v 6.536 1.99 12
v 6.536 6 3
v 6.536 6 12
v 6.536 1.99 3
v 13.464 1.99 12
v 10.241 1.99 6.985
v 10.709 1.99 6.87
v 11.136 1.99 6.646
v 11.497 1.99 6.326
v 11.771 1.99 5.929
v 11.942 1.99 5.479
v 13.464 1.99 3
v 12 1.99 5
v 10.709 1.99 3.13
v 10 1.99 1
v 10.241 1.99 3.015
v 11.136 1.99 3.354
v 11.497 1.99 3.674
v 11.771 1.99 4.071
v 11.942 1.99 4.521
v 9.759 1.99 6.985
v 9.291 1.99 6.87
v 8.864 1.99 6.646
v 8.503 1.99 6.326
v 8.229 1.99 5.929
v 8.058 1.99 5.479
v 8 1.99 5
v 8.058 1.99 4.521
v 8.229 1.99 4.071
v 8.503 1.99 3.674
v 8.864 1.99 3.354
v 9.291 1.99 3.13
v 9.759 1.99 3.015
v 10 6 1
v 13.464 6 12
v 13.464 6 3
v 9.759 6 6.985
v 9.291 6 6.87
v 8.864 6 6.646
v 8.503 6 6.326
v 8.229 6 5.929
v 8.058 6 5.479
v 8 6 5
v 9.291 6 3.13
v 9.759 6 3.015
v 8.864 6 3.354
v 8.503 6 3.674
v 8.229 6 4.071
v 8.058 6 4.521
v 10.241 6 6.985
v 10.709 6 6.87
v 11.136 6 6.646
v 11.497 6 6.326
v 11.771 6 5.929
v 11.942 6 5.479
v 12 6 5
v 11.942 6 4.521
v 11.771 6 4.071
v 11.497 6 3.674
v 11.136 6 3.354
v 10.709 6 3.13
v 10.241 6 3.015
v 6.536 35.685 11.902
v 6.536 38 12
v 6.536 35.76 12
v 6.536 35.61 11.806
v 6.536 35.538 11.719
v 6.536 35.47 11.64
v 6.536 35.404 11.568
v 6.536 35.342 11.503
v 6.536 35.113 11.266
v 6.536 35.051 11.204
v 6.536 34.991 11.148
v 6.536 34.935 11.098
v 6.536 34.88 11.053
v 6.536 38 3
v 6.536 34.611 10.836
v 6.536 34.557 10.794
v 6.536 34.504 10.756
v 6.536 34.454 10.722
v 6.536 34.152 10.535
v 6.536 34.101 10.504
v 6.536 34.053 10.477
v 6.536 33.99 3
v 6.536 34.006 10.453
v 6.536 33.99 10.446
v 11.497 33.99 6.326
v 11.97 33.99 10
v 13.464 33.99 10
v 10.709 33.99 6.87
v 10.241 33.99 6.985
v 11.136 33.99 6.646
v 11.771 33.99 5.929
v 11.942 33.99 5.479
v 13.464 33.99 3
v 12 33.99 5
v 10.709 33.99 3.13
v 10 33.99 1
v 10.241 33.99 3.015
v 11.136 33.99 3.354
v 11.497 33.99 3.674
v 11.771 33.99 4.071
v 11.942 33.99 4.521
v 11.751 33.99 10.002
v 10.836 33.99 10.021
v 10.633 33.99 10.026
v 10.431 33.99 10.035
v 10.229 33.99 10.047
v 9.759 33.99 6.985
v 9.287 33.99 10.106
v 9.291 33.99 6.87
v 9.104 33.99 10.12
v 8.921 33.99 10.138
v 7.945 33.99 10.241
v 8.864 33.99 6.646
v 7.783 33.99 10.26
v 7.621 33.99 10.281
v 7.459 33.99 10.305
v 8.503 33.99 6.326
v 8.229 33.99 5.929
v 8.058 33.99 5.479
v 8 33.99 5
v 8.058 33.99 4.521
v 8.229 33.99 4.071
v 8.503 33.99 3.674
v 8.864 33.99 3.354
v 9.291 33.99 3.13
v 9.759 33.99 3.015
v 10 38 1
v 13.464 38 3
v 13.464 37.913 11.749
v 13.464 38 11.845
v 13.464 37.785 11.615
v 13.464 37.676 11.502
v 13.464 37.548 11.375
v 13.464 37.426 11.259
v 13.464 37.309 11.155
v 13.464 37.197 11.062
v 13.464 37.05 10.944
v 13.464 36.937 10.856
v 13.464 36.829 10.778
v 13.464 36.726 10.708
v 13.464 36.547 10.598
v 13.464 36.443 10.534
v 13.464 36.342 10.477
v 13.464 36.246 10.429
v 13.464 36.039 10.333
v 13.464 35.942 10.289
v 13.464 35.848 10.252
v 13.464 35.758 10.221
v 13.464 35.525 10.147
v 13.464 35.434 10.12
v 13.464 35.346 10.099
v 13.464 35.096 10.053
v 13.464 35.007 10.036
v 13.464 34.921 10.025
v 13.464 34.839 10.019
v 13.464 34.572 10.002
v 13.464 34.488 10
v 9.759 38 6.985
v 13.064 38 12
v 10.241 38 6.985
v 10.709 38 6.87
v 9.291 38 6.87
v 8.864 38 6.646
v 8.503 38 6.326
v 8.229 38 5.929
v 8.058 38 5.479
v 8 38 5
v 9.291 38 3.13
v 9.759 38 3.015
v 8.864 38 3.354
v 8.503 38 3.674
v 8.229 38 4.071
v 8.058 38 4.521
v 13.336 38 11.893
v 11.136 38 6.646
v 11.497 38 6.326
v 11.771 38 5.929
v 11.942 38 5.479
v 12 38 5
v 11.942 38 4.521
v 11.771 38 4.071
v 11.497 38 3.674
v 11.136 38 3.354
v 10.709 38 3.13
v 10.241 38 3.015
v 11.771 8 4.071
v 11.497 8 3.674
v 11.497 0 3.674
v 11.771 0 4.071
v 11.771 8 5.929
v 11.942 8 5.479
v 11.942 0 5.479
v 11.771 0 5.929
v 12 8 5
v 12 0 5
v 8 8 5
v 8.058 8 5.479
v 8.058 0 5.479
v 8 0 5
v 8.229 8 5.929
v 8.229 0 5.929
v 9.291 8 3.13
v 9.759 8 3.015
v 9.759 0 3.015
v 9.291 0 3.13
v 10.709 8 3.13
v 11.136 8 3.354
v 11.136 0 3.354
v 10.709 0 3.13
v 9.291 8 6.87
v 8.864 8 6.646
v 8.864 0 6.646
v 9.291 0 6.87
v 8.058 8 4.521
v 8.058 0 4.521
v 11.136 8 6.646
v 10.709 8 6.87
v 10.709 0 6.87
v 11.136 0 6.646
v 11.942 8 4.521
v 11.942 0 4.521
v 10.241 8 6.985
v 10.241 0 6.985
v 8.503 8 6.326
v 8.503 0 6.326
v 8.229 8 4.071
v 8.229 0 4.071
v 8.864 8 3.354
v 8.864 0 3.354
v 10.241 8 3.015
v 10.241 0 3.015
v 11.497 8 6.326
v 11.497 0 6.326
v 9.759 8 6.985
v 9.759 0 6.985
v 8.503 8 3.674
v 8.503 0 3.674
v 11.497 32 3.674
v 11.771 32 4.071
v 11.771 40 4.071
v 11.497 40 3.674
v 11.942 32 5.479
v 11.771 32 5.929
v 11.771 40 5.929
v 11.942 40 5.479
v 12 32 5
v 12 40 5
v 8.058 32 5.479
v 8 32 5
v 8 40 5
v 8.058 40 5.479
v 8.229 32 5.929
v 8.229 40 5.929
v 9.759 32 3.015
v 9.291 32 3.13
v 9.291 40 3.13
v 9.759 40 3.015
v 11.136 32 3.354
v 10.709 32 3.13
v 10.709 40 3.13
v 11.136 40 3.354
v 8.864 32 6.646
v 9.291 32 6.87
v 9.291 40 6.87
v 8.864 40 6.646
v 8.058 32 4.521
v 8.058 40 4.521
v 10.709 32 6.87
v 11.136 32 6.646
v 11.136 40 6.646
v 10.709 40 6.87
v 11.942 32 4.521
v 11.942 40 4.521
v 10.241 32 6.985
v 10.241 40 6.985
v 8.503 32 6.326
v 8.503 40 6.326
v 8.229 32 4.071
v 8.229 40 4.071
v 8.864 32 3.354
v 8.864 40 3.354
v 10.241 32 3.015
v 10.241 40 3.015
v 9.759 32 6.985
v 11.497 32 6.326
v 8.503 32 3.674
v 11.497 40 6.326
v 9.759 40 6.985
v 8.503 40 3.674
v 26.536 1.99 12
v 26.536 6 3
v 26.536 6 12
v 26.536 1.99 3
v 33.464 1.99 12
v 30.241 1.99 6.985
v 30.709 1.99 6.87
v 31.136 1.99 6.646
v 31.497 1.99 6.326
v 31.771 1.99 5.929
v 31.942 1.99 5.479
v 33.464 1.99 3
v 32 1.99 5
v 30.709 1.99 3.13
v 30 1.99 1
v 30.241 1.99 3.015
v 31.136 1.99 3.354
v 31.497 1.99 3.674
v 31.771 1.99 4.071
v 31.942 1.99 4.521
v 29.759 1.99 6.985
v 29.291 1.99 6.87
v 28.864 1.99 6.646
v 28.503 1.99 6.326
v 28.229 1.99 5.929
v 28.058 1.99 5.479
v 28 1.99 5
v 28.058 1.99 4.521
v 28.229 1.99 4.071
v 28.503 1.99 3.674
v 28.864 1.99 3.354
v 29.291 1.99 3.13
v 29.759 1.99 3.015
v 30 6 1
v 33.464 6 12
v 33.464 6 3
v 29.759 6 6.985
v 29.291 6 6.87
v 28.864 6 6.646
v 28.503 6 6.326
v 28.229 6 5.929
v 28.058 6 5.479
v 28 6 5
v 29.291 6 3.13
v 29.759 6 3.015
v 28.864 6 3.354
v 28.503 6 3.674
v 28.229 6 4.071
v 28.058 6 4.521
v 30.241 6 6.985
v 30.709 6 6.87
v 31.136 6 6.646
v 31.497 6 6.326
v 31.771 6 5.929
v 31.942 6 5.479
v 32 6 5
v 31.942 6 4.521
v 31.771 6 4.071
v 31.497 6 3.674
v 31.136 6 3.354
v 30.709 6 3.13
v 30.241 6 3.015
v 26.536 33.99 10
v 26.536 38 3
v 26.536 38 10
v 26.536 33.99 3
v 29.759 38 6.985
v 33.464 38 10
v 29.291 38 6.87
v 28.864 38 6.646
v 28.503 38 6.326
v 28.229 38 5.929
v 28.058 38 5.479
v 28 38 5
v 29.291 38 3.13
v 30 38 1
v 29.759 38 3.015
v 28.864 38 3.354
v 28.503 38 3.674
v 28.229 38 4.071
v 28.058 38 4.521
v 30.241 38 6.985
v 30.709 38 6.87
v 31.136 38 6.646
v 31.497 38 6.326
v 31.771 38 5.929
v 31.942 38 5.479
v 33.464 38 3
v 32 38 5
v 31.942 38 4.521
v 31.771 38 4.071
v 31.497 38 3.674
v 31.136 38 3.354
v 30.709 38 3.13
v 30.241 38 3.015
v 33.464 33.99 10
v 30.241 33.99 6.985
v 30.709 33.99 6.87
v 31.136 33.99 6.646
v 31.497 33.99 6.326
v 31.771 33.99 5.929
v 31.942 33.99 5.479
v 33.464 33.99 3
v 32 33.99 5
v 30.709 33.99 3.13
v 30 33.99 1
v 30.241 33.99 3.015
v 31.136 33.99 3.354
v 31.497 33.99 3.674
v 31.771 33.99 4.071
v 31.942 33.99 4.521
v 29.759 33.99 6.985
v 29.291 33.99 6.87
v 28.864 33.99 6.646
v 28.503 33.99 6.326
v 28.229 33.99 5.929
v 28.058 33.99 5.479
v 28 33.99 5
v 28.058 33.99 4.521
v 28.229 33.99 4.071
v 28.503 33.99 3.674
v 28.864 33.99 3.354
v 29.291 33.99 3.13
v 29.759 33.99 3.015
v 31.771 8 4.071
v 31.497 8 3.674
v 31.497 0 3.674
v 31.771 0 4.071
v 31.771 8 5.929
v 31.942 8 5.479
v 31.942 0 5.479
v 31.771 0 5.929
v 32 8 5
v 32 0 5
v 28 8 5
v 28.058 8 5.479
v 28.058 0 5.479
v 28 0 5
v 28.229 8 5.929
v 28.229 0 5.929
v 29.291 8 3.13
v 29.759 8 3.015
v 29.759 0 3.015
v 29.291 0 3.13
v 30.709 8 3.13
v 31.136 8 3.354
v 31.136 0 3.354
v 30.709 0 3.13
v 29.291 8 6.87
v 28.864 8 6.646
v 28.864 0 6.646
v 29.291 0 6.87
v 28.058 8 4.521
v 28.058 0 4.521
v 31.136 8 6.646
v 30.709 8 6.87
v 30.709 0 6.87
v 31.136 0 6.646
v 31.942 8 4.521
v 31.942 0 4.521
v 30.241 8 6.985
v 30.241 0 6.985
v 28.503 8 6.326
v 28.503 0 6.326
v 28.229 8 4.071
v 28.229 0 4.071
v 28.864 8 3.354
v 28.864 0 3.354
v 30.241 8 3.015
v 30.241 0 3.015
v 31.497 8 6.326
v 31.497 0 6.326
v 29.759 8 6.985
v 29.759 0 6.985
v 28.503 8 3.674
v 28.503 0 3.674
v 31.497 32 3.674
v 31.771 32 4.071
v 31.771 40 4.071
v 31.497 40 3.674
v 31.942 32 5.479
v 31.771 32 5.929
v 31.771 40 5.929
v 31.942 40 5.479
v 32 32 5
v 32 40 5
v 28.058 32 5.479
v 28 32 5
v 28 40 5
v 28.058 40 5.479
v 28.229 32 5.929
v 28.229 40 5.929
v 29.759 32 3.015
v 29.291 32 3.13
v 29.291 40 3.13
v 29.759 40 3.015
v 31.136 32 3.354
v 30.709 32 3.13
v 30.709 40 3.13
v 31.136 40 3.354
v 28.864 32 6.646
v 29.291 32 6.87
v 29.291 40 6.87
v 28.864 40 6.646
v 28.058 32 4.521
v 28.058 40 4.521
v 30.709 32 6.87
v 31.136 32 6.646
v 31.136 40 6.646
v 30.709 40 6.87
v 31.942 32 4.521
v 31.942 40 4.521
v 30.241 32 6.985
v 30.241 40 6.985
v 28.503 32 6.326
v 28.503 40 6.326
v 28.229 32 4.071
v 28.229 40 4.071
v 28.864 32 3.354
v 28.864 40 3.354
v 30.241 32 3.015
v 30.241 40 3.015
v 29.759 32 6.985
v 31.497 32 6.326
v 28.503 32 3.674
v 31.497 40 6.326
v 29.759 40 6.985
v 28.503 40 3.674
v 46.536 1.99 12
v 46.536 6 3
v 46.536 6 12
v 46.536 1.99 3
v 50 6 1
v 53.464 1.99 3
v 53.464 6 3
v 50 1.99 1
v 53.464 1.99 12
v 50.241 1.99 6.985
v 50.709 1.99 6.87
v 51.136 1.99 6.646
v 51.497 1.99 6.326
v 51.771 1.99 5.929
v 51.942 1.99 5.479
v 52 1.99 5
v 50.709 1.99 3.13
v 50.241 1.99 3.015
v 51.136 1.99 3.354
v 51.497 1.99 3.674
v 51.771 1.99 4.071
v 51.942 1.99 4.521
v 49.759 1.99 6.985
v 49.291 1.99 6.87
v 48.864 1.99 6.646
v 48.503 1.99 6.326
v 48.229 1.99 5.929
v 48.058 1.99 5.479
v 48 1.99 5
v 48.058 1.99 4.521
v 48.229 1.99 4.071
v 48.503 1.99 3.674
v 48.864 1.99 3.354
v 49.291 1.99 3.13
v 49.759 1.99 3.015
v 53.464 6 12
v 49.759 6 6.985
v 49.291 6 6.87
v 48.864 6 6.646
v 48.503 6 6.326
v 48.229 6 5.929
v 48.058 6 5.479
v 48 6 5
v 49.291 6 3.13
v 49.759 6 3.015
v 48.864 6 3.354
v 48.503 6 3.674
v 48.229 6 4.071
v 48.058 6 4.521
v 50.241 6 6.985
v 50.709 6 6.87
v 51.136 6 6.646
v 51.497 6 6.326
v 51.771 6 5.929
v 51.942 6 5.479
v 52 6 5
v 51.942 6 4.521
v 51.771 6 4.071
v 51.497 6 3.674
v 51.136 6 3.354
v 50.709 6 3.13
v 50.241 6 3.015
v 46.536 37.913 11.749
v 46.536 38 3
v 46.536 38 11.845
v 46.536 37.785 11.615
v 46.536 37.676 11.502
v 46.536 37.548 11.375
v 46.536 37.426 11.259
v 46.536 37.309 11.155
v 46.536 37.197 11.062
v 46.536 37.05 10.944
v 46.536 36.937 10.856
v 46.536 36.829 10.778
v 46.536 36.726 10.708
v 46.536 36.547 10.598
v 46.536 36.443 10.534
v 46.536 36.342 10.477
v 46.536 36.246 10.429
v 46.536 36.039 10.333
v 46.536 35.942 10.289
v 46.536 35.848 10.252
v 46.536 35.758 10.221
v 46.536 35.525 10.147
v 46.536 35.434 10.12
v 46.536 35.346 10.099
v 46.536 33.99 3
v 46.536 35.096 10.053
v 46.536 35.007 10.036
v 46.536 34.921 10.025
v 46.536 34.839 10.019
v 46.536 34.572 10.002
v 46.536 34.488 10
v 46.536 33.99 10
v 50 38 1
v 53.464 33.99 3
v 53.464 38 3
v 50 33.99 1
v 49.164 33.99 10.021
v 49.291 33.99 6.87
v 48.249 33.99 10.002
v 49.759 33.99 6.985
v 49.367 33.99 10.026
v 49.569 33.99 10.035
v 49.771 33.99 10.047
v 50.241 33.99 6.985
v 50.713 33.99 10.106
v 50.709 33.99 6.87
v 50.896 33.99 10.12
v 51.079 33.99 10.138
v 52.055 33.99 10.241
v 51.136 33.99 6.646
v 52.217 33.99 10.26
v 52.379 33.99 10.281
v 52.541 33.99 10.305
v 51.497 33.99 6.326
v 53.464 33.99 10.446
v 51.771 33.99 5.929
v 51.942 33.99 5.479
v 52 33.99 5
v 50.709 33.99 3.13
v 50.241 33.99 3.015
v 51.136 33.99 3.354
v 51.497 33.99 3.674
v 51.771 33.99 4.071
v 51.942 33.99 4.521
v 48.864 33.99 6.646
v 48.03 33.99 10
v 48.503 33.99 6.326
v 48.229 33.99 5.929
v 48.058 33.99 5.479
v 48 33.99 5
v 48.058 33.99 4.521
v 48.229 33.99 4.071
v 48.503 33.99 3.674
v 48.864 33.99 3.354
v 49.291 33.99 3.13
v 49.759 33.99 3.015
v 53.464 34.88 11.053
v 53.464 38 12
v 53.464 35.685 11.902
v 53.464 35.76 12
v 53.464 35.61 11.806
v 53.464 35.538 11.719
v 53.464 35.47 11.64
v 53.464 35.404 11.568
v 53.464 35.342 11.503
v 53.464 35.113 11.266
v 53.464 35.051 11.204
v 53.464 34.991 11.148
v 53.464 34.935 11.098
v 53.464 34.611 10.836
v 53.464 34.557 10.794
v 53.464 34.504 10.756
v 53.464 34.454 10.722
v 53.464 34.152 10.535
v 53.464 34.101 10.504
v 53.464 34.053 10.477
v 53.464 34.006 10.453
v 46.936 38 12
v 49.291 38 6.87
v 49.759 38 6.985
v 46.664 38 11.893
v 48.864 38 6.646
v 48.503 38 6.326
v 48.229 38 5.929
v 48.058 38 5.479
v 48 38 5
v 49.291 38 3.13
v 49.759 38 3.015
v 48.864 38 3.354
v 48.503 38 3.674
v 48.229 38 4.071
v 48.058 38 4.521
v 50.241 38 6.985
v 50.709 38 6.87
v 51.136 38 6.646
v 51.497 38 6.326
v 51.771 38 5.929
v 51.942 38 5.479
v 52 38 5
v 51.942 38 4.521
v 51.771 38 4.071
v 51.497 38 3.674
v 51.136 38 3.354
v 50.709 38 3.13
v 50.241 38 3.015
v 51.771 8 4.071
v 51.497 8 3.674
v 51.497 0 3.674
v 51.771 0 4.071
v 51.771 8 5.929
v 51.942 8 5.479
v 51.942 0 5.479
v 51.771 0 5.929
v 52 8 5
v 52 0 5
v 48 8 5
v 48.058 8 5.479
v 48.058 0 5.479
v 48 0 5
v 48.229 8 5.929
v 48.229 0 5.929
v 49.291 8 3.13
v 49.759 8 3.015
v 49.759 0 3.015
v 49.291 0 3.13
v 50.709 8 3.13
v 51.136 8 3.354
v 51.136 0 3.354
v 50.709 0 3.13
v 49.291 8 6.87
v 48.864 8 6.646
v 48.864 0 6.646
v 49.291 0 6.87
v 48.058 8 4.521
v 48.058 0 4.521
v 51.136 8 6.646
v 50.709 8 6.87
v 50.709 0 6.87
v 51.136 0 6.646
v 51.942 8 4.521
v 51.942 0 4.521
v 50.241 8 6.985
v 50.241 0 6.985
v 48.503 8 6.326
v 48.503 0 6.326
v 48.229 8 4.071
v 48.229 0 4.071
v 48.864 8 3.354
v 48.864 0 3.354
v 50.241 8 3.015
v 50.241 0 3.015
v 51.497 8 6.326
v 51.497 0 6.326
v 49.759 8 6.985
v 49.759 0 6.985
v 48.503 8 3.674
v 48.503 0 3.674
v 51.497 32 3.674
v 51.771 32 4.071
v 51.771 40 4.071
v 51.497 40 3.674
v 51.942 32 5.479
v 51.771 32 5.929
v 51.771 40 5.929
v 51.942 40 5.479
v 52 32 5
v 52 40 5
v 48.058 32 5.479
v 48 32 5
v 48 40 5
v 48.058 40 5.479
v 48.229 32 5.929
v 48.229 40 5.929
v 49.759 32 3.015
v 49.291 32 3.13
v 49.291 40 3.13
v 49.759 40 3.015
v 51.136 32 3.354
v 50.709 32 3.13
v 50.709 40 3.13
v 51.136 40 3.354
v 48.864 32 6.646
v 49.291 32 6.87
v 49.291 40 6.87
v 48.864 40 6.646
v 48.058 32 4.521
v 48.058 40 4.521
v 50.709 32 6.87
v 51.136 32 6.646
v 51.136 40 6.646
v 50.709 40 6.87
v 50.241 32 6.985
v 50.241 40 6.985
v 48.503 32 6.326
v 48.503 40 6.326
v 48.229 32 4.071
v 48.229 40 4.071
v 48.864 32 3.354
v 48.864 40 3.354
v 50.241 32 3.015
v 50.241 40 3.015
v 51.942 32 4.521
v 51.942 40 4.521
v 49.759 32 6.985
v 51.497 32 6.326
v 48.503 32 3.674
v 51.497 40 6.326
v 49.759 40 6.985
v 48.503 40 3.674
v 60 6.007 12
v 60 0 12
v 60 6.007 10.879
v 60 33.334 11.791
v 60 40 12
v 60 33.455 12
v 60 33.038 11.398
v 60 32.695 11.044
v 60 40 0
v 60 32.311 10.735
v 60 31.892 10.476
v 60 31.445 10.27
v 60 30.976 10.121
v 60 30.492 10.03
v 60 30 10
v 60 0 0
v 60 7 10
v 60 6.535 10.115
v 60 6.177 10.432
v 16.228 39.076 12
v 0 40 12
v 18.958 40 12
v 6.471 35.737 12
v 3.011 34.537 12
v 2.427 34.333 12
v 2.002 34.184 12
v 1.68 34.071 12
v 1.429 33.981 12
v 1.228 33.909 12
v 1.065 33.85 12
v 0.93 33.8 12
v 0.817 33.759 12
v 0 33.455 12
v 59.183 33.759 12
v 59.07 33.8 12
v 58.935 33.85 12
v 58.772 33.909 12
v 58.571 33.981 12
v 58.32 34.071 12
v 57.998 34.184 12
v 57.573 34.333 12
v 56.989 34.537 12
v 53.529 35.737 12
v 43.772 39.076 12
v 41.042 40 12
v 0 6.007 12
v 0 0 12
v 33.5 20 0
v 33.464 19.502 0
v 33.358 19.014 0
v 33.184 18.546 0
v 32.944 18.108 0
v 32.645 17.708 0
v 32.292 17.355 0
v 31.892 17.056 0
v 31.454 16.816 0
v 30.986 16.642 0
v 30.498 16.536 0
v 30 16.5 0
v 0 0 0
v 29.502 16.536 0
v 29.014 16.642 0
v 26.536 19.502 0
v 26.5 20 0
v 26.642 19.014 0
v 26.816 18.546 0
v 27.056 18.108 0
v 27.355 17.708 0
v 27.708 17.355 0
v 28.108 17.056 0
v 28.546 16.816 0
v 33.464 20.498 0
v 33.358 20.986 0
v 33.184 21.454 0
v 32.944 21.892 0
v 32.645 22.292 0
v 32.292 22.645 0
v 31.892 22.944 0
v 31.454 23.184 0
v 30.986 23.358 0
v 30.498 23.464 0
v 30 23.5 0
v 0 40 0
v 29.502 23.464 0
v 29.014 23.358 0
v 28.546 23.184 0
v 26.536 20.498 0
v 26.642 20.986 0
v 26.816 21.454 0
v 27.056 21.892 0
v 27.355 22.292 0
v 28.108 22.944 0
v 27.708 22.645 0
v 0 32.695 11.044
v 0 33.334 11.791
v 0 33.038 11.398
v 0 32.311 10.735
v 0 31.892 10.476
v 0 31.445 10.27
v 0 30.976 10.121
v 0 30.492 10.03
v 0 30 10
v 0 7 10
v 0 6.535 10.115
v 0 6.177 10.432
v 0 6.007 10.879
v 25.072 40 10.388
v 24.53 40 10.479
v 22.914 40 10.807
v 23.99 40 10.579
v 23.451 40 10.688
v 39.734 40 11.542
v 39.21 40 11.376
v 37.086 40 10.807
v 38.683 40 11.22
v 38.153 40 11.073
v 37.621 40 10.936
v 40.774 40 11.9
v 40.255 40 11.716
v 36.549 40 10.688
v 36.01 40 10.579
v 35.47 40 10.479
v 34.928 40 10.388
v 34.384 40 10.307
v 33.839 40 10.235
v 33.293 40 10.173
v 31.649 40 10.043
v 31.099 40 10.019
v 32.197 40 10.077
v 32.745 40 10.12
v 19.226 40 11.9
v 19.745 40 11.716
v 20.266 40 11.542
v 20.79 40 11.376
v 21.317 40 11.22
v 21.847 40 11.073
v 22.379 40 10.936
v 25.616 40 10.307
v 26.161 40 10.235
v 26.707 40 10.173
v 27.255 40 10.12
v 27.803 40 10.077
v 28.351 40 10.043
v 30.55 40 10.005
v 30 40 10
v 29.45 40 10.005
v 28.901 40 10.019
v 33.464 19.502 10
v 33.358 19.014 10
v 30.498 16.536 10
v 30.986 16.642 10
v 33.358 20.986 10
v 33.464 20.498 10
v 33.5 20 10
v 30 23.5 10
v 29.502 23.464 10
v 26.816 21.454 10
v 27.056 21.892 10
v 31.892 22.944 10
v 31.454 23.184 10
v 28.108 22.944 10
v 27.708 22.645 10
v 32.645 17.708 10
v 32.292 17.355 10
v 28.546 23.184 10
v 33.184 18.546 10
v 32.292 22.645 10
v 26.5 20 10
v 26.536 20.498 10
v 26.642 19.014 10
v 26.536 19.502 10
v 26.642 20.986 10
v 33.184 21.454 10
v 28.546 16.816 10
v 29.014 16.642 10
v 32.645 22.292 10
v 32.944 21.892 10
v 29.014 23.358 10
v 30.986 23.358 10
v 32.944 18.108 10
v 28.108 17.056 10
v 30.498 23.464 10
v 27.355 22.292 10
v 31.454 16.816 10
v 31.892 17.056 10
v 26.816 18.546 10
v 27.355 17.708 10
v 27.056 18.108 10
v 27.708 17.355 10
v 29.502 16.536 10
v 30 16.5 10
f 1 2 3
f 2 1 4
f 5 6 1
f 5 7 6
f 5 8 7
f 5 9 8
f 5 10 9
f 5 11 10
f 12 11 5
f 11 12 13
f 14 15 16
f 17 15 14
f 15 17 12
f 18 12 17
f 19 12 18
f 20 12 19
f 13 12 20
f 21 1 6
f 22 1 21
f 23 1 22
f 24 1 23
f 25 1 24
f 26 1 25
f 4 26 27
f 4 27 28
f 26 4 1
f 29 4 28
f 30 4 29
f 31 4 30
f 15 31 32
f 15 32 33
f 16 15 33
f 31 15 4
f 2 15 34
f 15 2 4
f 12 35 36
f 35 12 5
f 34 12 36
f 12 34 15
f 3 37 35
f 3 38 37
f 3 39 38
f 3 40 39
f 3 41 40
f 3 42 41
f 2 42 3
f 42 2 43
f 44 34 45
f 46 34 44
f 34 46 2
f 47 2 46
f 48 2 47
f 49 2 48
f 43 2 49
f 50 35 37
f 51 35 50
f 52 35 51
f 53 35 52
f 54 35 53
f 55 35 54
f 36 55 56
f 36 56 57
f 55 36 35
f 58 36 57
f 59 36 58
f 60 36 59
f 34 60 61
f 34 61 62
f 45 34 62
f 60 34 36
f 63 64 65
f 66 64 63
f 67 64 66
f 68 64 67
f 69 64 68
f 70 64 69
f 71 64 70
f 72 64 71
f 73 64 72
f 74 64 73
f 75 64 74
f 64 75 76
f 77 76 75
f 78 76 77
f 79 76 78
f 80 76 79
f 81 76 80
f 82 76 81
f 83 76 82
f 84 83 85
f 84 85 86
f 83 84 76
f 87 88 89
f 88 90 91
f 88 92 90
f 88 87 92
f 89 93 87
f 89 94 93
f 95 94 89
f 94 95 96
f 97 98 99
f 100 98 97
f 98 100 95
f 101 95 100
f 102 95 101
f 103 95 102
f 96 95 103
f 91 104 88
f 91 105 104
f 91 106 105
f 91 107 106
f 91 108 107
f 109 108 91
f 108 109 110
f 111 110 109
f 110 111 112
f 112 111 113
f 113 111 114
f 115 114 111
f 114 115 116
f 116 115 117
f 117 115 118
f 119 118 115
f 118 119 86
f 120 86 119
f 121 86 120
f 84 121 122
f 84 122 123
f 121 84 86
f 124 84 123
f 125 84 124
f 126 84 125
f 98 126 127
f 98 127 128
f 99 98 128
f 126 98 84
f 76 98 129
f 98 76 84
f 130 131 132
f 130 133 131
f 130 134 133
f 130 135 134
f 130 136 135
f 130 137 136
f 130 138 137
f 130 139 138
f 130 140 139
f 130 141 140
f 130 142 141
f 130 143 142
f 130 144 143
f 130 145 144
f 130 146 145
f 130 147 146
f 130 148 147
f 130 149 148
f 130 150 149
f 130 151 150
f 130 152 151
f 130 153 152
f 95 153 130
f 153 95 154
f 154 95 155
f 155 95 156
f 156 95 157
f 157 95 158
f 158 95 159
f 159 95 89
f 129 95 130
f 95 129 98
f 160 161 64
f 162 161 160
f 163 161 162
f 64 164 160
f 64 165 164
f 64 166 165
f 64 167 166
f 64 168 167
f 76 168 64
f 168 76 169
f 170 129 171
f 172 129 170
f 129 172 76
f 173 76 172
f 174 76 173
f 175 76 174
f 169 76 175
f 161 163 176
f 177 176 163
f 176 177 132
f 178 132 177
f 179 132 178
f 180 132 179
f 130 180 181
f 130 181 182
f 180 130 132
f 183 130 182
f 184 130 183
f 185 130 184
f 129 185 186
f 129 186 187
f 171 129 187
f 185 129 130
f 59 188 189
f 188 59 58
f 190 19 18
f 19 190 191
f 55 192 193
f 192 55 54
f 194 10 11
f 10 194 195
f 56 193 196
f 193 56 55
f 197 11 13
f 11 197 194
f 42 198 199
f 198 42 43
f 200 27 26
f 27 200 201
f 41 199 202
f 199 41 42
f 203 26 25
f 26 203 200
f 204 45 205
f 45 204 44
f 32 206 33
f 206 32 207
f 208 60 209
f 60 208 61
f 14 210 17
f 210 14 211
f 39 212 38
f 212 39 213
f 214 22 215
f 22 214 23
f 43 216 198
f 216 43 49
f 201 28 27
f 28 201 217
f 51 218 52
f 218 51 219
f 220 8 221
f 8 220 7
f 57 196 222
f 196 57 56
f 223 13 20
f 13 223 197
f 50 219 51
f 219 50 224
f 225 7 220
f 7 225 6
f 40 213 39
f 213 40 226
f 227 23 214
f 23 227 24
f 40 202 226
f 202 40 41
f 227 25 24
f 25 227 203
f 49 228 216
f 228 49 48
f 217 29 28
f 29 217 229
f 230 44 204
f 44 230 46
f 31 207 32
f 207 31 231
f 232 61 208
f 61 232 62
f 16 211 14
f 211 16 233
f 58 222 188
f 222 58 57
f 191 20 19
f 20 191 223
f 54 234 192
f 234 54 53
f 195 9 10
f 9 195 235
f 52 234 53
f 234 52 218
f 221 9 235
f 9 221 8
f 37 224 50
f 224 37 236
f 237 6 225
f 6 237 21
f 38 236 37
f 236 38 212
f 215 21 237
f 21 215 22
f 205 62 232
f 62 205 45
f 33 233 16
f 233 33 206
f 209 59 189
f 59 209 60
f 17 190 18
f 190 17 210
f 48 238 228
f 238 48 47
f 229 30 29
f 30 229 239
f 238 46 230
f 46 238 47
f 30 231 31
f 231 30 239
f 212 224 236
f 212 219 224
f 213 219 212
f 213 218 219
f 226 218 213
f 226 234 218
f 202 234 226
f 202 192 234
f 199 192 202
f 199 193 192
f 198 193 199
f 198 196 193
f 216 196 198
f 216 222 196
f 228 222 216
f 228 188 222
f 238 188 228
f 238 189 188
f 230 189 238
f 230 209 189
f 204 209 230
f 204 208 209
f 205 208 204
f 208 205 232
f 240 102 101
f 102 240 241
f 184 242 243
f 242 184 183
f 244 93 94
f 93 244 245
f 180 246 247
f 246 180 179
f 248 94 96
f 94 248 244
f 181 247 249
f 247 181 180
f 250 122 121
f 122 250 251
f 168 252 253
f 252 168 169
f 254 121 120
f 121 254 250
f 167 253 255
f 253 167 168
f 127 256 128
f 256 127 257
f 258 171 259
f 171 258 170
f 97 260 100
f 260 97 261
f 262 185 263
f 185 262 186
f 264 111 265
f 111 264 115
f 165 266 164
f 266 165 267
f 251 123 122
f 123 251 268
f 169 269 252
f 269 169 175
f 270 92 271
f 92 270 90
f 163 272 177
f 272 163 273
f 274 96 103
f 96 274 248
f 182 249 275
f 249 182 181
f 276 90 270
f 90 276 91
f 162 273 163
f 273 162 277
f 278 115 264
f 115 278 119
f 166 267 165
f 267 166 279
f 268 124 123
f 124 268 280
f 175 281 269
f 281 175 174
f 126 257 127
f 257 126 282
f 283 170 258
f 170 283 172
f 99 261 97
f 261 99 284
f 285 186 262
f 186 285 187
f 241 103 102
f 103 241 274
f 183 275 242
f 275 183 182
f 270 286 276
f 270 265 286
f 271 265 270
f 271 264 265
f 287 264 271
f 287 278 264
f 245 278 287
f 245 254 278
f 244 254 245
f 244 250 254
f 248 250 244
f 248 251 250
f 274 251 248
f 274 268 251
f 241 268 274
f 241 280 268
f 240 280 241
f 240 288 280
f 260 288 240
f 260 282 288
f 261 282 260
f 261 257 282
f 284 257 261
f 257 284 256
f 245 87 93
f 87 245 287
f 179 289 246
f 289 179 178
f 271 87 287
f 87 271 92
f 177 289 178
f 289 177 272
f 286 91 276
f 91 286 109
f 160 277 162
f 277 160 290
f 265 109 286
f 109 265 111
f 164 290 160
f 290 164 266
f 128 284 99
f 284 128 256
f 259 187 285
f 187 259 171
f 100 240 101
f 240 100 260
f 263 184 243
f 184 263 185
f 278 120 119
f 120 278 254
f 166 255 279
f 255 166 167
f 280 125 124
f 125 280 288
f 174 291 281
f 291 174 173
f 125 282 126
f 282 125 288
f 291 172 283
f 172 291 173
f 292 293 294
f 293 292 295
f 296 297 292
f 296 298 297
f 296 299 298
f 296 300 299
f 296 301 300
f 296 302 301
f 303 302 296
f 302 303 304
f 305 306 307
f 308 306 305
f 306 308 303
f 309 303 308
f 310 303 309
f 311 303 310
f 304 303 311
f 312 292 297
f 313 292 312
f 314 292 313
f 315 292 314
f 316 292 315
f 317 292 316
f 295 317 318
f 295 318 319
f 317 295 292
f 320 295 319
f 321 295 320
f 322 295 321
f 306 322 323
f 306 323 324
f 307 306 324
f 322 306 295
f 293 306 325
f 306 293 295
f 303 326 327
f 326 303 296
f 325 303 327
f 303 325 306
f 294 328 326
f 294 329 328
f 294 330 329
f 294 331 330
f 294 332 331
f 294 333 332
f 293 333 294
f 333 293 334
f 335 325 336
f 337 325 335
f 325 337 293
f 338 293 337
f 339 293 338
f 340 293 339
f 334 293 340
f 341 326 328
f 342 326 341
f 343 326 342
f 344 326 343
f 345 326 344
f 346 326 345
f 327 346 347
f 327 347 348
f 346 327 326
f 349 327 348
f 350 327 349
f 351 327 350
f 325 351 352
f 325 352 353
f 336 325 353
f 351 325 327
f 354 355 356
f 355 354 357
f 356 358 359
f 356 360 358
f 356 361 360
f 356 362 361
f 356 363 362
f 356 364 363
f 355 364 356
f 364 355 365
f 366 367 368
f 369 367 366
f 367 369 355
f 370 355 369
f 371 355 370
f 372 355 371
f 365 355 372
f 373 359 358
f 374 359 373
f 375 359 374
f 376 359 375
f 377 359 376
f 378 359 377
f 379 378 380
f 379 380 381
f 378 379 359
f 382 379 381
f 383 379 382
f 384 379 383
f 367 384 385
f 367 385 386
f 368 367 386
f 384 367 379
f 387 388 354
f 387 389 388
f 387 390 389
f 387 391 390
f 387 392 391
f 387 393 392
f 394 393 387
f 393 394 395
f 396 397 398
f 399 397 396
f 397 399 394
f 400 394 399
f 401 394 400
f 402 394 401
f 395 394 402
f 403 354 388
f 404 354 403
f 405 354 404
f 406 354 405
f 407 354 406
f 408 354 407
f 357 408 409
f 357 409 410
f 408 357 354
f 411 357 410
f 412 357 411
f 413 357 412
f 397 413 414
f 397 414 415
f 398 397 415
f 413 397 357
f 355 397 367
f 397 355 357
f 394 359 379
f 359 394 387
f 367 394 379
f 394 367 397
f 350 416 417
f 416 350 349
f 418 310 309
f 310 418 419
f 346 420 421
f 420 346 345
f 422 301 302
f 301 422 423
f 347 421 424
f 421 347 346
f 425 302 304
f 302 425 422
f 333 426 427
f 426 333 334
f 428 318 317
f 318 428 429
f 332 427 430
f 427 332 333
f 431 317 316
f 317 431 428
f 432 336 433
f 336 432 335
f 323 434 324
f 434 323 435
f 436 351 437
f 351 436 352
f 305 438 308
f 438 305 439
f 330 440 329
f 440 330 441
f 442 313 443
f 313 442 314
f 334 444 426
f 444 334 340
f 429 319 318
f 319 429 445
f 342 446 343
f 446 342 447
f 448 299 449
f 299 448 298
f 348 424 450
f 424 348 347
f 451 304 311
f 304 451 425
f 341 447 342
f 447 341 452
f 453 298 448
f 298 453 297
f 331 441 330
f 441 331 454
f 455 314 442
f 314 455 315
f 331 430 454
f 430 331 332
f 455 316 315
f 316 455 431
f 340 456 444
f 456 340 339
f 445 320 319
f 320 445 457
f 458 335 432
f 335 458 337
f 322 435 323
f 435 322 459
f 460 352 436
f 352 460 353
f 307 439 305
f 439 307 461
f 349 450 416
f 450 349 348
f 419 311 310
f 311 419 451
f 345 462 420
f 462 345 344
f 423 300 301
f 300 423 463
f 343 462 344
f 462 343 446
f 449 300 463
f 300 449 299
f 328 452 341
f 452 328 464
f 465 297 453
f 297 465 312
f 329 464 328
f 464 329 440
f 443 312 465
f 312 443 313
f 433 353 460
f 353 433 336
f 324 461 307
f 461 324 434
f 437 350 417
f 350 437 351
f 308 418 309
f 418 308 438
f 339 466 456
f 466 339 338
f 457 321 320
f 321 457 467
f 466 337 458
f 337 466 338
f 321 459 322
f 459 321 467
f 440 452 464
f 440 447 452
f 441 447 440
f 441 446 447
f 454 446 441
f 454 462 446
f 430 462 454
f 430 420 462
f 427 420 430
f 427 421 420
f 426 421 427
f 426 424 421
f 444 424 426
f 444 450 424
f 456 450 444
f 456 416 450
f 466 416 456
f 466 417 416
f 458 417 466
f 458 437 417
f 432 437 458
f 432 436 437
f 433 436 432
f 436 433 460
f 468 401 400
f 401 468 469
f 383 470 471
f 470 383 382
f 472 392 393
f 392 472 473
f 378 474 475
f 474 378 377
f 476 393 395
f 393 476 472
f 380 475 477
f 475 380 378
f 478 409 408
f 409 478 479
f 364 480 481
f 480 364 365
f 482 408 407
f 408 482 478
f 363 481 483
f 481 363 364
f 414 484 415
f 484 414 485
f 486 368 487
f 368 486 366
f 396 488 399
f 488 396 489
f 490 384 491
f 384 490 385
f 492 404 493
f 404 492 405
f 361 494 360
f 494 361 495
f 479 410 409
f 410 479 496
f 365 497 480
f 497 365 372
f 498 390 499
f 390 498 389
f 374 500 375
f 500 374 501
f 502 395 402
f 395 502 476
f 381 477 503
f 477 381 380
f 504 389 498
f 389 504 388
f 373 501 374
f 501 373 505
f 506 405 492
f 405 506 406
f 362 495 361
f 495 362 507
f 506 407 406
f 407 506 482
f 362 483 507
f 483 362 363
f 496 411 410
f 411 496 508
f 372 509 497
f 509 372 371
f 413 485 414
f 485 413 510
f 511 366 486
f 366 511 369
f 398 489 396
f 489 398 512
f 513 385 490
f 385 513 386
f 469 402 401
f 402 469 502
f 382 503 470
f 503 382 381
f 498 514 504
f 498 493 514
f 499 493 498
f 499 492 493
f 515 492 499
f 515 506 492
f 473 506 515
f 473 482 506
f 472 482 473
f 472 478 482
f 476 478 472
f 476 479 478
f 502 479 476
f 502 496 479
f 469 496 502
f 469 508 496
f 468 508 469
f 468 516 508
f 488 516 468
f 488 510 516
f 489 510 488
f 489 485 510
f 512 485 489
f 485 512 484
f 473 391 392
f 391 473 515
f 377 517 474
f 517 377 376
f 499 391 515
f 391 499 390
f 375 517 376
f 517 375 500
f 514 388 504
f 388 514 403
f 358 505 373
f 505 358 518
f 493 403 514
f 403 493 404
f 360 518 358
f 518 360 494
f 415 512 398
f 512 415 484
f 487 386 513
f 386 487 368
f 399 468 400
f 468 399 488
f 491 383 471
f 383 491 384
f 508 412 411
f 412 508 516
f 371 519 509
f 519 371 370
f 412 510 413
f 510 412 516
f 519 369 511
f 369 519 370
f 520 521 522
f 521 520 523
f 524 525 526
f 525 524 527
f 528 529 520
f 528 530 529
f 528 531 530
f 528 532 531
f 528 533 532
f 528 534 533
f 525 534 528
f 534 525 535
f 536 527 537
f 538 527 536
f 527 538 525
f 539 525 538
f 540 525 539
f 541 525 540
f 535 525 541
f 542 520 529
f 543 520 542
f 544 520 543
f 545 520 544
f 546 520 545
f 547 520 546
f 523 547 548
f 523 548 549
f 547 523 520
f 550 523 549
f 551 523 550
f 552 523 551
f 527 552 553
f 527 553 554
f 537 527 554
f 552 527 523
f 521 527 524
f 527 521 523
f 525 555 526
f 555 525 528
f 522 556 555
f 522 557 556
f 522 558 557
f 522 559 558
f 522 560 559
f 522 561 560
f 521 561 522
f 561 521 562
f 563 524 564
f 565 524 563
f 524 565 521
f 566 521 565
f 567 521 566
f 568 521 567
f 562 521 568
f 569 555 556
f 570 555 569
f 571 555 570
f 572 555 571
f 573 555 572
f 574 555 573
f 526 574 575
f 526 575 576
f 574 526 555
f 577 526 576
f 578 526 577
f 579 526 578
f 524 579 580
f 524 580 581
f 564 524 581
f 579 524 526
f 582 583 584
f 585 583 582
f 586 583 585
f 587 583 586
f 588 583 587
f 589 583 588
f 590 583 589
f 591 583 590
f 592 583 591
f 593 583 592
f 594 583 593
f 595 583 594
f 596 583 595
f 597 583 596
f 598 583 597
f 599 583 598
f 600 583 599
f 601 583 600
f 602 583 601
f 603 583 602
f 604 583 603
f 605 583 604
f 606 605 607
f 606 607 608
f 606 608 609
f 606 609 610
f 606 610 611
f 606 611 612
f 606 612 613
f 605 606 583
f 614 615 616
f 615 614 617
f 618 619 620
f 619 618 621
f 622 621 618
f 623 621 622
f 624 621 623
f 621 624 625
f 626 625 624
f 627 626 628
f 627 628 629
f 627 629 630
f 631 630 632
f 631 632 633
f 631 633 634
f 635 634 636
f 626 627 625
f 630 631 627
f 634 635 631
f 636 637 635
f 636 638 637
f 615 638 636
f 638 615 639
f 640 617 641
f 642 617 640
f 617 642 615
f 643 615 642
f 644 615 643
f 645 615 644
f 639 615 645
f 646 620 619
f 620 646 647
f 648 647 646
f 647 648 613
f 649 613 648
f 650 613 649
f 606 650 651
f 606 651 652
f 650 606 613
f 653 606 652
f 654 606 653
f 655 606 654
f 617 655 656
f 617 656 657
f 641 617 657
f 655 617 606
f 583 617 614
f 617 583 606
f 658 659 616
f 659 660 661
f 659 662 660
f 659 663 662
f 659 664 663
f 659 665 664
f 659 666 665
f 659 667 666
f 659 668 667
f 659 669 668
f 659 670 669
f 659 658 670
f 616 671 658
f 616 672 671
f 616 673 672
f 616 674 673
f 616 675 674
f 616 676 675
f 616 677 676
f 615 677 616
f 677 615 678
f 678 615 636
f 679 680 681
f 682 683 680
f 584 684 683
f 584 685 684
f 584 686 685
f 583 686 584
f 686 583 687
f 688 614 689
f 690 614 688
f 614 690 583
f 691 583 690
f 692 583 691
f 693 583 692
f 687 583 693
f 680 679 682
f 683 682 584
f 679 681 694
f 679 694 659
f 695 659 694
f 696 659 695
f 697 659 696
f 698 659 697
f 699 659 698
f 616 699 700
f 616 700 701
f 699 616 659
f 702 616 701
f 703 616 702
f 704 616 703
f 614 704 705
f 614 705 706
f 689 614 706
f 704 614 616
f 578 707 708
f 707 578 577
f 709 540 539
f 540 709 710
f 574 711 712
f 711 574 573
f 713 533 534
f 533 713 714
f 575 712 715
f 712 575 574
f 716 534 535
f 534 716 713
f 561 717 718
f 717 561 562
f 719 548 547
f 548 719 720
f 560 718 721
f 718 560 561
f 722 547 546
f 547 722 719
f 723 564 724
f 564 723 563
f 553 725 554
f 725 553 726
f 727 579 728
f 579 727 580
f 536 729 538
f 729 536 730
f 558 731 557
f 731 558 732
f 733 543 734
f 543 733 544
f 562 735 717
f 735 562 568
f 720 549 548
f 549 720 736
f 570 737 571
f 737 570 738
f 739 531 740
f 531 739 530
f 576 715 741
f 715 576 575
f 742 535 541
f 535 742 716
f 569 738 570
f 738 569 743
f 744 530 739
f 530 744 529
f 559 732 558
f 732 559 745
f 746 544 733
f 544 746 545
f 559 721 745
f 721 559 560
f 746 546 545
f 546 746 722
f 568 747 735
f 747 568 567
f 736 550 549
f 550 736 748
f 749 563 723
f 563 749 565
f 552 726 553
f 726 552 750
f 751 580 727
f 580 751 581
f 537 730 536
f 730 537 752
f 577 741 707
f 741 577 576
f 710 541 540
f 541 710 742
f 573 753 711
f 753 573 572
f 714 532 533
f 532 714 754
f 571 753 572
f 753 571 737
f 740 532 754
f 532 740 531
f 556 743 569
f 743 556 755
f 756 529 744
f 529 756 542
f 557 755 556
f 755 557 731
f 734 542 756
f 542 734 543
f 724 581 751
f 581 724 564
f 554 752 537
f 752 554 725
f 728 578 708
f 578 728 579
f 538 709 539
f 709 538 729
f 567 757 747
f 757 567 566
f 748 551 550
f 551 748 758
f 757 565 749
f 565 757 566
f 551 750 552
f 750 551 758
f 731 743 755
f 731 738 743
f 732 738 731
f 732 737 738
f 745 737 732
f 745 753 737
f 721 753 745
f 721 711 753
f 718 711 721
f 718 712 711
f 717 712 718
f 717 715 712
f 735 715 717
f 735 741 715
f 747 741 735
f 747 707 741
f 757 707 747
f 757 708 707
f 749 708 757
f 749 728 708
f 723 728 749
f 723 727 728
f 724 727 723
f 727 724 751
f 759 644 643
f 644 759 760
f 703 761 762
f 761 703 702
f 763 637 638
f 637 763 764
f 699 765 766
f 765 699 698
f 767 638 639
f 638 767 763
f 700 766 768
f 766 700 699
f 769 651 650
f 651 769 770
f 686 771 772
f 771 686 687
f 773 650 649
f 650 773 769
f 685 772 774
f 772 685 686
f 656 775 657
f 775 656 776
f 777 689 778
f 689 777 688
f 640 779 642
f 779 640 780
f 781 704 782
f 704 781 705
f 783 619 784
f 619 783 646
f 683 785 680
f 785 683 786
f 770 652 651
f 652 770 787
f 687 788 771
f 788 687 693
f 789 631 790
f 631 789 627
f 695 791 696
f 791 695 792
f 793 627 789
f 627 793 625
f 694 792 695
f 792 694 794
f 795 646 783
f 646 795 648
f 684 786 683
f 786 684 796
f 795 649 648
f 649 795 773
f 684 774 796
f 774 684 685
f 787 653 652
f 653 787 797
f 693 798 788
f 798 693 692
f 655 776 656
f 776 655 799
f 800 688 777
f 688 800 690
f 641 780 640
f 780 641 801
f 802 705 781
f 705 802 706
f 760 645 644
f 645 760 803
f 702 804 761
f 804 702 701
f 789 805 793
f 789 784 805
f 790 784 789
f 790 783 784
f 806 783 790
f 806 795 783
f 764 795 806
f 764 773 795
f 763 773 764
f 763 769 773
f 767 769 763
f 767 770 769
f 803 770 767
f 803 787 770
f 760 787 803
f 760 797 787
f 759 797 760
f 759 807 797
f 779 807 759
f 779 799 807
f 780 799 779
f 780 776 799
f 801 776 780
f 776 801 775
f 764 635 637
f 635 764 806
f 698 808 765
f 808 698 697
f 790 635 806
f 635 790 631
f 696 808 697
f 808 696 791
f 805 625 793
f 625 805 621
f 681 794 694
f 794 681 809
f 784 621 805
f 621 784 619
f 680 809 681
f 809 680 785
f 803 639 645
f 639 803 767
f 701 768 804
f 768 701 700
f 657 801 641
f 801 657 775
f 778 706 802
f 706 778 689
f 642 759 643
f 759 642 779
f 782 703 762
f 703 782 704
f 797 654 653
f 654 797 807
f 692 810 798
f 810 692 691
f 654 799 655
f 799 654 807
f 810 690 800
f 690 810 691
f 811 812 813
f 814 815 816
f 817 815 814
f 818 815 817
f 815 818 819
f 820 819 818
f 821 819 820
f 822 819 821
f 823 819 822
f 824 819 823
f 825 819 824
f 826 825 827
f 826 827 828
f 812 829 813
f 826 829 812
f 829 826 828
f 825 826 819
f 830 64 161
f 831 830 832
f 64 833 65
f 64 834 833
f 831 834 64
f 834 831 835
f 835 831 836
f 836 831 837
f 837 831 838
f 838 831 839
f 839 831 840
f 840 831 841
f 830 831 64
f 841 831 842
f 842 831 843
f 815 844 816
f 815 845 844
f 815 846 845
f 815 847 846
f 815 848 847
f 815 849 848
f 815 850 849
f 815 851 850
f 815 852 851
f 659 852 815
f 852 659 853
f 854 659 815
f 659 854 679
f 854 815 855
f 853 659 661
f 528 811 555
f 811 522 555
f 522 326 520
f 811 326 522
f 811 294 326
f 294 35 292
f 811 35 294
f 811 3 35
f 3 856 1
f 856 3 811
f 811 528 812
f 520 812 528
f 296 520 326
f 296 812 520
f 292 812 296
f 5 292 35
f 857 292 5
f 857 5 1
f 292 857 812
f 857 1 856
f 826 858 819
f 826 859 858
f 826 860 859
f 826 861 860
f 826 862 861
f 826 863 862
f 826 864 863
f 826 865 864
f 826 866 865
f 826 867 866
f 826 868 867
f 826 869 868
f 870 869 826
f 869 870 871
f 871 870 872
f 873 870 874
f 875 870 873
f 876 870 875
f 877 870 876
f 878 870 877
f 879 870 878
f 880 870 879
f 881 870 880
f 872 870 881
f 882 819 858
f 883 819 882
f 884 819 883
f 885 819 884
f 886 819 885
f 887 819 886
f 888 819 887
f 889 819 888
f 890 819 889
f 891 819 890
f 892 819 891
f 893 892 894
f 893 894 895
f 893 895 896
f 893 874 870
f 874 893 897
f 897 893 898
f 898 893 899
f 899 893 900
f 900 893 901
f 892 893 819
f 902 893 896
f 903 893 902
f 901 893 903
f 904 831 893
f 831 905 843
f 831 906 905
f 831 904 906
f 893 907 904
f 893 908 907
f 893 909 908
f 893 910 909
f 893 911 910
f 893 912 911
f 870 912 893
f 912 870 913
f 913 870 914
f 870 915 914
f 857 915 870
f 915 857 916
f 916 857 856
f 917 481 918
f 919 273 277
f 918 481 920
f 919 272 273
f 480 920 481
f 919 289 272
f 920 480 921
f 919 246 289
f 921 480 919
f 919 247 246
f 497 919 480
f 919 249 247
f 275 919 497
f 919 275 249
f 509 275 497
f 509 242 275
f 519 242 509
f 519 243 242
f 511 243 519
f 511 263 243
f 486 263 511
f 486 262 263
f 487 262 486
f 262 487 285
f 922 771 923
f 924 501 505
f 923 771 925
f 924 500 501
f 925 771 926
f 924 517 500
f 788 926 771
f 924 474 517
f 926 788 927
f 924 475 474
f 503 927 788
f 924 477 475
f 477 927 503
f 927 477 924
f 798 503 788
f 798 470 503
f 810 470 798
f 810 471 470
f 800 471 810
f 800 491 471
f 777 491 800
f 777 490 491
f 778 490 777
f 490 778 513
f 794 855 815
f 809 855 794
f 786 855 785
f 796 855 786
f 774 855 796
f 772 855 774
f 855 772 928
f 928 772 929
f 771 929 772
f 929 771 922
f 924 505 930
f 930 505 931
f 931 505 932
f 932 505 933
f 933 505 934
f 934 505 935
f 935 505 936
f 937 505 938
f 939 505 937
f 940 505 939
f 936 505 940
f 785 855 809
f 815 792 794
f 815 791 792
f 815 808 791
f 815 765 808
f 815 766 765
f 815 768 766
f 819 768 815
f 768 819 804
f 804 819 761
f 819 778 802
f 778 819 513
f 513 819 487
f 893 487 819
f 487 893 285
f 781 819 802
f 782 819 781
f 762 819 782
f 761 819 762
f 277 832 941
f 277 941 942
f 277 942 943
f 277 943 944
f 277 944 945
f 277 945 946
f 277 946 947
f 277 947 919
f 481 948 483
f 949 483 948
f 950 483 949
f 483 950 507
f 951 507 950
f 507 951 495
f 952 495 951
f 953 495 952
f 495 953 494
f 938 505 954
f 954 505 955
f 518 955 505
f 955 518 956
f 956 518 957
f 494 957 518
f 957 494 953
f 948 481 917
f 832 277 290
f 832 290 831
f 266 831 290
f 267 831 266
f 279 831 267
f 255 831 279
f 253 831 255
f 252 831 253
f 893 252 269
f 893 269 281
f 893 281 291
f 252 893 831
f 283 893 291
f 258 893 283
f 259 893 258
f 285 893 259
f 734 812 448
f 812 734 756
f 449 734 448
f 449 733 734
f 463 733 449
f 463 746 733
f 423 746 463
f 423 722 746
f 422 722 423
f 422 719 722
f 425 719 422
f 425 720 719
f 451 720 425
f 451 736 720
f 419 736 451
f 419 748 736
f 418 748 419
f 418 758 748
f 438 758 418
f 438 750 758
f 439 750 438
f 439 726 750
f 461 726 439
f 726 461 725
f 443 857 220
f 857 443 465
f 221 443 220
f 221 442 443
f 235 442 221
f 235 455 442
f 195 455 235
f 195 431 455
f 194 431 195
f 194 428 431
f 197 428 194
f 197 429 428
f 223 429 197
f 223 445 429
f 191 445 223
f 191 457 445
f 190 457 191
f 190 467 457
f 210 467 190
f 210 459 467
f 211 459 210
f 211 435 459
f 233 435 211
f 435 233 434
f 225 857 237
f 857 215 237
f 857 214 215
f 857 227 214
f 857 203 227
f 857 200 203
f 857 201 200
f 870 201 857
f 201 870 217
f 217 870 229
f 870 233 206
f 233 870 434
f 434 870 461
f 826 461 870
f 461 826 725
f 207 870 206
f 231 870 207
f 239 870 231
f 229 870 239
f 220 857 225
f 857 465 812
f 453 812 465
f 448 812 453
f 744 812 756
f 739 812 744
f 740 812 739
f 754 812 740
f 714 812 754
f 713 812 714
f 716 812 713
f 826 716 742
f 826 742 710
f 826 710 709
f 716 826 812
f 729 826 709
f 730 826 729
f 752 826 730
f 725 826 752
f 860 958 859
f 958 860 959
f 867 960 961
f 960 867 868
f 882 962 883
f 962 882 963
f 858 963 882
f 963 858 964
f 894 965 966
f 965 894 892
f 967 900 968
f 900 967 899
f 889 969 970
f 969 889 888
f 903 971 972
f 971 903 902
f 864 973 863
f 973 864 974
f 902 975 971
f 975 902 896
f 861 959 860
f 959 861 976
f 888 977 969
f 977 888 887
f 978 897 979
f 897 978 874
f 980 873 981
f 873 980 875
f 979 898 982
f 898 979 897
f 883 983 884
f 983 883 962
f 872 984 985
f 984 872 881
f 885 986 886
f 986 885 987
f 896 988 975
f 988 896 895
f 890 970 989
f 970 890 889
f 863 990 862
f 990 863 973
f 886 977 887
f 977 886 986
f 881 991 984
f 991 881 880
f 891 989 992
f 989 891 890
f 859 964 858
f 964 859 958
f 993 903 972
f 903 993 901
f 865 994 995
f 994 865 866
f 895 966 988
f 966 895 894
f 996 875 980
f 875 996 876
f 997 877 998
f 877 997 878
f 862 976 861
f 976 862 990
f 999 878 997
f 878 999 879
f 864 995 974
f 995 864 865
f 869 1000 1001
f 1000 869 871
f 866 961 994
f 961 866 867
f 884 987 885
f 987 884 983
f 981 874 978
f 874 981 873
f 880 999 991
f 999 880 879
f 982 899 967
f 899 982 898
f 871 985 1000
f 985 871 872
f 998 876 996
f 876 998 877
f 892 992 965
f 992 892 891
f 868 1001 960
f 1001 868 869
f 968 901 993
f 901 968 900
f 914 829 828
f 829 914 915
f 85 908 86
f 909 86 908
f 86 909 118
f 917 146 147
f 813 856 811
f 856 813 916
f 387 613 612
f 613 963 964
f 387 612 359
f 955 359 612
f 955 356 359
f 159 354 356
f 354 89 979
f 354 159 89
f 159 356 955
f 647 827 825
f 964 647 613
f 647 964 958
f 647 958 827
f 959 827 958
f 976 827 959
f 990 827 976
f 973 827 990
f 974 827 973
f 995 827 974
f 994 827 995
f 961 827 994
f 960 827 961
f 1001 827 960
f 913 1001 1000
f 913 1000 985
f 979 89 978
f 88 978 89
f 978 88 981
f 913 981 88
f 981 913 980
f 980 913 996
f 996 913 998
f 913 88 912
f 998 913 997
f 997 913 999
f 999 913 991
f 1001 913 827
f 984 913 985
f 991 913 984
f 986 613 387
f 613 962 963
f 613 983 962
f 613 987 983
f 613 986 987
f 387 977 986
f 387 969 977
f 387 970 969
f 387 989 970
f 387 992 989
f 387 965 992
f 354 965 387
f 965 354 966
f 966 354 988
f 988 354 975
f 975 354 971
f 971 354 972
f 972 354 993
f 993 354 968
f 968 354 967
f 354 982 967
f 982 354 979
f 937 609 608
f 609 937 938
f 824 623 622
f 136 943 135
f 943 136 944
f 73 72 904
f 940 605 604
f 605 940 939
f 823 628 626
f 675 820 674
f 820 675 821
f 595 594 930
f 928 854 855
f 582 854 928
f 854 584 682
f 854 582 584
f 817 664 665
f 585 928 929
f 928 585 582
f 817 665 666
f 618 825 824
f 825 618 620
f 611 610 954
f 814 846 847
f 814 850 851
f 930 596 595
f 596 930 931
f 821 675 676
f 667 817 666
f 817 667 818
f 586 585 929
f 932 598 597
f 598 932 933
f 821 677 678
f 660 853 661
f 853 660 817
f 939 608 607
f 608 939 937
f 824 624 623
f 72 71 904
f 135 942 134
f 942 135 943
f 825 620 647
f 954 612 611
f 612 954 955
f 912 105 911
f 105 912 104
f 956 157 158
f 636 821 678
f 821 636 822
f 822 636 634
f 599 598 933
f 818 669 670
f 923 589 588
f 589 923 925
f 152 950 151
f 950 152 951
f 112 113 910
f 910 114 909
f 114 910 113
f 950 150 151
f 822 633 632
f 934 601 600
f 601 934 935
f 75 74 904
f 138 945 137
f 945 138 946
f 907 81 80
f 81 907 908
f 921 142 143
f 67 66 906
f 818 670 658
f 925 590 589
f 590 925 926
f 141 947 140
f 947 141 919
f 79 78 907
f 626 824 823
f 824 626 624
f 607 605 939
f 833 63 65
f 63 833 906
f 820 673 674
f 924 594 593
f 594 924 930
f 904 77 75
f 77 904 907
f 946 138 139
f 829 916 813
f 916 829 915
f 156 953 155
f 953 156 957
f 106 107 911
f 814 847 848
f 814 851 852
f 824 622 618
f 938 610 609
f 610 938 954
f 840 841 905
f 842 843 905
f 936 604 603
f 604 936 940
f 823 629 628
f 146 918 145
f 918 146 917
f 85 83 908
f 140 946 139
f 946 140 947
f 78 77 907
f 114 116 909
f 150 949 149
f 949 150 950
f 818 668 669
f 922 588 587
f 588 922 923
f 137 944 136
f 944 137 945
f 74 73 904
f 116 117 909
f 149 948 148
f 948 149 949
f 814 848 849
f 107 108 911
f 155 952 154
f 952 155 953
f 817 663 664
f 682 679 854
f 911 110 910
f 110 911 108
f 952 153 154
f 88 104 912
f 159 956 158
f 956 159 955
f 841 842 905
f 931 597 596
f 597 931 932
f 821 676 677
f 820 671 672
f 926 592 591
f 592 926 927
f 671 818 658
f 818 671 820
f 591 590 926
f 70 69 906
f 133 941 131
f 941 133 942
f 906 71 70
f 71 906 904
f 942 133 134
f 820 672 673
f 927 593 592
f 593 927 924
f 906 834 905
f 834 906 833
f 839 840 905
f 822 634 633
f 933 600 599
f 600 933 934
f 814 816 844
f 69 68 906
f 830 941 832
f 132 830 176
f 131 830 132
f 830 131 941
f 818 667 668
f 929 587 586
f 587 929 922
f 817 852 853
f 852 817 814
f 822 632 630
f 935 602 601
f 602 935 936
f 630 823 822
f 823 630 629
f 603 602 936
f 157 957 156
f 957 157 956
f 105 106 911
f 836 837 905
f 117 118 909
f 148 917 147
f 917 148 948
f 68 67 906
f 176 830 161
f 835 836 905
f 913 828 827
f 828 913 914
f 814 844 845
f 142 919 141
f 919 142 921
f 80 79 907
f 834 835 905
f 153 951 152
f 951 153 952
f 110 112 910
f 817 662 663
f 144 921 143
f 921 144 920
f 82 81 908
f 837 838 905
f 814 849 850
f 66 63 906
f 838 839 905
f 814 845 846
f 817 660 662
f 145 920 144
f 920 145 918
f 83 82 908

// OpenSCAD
/*
difference() {
  translate([-45,-20,-70])cube([90,40,70]);
  translate([-30,0,-54])rotate([90,0,0])cylinder(d=16,h=50,center=true);
  translate([30,0,-54])rotate([90,0,0])cylinder(d=16,h=50,center=true);
  }
  */
d_nut=8;
h_nut=4;
d_bolt=4;
thickness=10;
border=2;
bissl=0.01;
$fa=1/1;
$fs=1/2;
depth=40;
module camera_plate() {
  difference() {
    cube([60,depth,thickness+border]);
    translate([30,depth/2,-bissl])cylinder(d=7,h=thickness+border+2*bissl);
    for (r=[10:20:60]) {
      translate([r,1.5*h_nut,thickness/2]) hull( ) {
        rotate([90,90,0]) cylinder(d=d_nut, h=h_nut+bissl,$fn=6);
        translate([0,0,thickness]) rotate([90,90,0]) cylinder(d=d_nut, h=h_nut+bissl,$fn=6);
      }  
      translate([r,depth-2*h_nut+1.5*h_nut,thickness/2]) hull( ) {
        rotate([90,90,0]) cylinder(d=d_nut, h=h_nut+bissl,$fn=6);
        translate([0,0,thickness]) rotate([90,90,0]) cylinder(d=d_nut, h=h_nut+bissl,$fn=6);
      }
      translate([r,2*h_nut,thickness/2]) rotate([90,0,0]) cylinder(d=d_bolt, h=2*h_nut+bissl);
      translate([r,depth+bissl,thickness/2]) rotate([90,0,0]) cylinder(d=d_bolt, h=2*h_nut+bissl);  
    }
    hull() {
      translate([0,depth/2+10,thickness+4])rotate([0,90,0])cylinder(d=8,h=60);
      translate([0,depth/2-13,thickness+1])rotate([0,90,0])cylinder(d=2,h=60);
      translate([0,depth/2-13,thickness+1+6])rotate([0,90,0])cylinder(d=2,h=60);
      translate([30,depth/2+20,thickness+31.5])rotate([90,0,0])cylinder(d=63,h=10);
    }
  }
}
camera_plate();
